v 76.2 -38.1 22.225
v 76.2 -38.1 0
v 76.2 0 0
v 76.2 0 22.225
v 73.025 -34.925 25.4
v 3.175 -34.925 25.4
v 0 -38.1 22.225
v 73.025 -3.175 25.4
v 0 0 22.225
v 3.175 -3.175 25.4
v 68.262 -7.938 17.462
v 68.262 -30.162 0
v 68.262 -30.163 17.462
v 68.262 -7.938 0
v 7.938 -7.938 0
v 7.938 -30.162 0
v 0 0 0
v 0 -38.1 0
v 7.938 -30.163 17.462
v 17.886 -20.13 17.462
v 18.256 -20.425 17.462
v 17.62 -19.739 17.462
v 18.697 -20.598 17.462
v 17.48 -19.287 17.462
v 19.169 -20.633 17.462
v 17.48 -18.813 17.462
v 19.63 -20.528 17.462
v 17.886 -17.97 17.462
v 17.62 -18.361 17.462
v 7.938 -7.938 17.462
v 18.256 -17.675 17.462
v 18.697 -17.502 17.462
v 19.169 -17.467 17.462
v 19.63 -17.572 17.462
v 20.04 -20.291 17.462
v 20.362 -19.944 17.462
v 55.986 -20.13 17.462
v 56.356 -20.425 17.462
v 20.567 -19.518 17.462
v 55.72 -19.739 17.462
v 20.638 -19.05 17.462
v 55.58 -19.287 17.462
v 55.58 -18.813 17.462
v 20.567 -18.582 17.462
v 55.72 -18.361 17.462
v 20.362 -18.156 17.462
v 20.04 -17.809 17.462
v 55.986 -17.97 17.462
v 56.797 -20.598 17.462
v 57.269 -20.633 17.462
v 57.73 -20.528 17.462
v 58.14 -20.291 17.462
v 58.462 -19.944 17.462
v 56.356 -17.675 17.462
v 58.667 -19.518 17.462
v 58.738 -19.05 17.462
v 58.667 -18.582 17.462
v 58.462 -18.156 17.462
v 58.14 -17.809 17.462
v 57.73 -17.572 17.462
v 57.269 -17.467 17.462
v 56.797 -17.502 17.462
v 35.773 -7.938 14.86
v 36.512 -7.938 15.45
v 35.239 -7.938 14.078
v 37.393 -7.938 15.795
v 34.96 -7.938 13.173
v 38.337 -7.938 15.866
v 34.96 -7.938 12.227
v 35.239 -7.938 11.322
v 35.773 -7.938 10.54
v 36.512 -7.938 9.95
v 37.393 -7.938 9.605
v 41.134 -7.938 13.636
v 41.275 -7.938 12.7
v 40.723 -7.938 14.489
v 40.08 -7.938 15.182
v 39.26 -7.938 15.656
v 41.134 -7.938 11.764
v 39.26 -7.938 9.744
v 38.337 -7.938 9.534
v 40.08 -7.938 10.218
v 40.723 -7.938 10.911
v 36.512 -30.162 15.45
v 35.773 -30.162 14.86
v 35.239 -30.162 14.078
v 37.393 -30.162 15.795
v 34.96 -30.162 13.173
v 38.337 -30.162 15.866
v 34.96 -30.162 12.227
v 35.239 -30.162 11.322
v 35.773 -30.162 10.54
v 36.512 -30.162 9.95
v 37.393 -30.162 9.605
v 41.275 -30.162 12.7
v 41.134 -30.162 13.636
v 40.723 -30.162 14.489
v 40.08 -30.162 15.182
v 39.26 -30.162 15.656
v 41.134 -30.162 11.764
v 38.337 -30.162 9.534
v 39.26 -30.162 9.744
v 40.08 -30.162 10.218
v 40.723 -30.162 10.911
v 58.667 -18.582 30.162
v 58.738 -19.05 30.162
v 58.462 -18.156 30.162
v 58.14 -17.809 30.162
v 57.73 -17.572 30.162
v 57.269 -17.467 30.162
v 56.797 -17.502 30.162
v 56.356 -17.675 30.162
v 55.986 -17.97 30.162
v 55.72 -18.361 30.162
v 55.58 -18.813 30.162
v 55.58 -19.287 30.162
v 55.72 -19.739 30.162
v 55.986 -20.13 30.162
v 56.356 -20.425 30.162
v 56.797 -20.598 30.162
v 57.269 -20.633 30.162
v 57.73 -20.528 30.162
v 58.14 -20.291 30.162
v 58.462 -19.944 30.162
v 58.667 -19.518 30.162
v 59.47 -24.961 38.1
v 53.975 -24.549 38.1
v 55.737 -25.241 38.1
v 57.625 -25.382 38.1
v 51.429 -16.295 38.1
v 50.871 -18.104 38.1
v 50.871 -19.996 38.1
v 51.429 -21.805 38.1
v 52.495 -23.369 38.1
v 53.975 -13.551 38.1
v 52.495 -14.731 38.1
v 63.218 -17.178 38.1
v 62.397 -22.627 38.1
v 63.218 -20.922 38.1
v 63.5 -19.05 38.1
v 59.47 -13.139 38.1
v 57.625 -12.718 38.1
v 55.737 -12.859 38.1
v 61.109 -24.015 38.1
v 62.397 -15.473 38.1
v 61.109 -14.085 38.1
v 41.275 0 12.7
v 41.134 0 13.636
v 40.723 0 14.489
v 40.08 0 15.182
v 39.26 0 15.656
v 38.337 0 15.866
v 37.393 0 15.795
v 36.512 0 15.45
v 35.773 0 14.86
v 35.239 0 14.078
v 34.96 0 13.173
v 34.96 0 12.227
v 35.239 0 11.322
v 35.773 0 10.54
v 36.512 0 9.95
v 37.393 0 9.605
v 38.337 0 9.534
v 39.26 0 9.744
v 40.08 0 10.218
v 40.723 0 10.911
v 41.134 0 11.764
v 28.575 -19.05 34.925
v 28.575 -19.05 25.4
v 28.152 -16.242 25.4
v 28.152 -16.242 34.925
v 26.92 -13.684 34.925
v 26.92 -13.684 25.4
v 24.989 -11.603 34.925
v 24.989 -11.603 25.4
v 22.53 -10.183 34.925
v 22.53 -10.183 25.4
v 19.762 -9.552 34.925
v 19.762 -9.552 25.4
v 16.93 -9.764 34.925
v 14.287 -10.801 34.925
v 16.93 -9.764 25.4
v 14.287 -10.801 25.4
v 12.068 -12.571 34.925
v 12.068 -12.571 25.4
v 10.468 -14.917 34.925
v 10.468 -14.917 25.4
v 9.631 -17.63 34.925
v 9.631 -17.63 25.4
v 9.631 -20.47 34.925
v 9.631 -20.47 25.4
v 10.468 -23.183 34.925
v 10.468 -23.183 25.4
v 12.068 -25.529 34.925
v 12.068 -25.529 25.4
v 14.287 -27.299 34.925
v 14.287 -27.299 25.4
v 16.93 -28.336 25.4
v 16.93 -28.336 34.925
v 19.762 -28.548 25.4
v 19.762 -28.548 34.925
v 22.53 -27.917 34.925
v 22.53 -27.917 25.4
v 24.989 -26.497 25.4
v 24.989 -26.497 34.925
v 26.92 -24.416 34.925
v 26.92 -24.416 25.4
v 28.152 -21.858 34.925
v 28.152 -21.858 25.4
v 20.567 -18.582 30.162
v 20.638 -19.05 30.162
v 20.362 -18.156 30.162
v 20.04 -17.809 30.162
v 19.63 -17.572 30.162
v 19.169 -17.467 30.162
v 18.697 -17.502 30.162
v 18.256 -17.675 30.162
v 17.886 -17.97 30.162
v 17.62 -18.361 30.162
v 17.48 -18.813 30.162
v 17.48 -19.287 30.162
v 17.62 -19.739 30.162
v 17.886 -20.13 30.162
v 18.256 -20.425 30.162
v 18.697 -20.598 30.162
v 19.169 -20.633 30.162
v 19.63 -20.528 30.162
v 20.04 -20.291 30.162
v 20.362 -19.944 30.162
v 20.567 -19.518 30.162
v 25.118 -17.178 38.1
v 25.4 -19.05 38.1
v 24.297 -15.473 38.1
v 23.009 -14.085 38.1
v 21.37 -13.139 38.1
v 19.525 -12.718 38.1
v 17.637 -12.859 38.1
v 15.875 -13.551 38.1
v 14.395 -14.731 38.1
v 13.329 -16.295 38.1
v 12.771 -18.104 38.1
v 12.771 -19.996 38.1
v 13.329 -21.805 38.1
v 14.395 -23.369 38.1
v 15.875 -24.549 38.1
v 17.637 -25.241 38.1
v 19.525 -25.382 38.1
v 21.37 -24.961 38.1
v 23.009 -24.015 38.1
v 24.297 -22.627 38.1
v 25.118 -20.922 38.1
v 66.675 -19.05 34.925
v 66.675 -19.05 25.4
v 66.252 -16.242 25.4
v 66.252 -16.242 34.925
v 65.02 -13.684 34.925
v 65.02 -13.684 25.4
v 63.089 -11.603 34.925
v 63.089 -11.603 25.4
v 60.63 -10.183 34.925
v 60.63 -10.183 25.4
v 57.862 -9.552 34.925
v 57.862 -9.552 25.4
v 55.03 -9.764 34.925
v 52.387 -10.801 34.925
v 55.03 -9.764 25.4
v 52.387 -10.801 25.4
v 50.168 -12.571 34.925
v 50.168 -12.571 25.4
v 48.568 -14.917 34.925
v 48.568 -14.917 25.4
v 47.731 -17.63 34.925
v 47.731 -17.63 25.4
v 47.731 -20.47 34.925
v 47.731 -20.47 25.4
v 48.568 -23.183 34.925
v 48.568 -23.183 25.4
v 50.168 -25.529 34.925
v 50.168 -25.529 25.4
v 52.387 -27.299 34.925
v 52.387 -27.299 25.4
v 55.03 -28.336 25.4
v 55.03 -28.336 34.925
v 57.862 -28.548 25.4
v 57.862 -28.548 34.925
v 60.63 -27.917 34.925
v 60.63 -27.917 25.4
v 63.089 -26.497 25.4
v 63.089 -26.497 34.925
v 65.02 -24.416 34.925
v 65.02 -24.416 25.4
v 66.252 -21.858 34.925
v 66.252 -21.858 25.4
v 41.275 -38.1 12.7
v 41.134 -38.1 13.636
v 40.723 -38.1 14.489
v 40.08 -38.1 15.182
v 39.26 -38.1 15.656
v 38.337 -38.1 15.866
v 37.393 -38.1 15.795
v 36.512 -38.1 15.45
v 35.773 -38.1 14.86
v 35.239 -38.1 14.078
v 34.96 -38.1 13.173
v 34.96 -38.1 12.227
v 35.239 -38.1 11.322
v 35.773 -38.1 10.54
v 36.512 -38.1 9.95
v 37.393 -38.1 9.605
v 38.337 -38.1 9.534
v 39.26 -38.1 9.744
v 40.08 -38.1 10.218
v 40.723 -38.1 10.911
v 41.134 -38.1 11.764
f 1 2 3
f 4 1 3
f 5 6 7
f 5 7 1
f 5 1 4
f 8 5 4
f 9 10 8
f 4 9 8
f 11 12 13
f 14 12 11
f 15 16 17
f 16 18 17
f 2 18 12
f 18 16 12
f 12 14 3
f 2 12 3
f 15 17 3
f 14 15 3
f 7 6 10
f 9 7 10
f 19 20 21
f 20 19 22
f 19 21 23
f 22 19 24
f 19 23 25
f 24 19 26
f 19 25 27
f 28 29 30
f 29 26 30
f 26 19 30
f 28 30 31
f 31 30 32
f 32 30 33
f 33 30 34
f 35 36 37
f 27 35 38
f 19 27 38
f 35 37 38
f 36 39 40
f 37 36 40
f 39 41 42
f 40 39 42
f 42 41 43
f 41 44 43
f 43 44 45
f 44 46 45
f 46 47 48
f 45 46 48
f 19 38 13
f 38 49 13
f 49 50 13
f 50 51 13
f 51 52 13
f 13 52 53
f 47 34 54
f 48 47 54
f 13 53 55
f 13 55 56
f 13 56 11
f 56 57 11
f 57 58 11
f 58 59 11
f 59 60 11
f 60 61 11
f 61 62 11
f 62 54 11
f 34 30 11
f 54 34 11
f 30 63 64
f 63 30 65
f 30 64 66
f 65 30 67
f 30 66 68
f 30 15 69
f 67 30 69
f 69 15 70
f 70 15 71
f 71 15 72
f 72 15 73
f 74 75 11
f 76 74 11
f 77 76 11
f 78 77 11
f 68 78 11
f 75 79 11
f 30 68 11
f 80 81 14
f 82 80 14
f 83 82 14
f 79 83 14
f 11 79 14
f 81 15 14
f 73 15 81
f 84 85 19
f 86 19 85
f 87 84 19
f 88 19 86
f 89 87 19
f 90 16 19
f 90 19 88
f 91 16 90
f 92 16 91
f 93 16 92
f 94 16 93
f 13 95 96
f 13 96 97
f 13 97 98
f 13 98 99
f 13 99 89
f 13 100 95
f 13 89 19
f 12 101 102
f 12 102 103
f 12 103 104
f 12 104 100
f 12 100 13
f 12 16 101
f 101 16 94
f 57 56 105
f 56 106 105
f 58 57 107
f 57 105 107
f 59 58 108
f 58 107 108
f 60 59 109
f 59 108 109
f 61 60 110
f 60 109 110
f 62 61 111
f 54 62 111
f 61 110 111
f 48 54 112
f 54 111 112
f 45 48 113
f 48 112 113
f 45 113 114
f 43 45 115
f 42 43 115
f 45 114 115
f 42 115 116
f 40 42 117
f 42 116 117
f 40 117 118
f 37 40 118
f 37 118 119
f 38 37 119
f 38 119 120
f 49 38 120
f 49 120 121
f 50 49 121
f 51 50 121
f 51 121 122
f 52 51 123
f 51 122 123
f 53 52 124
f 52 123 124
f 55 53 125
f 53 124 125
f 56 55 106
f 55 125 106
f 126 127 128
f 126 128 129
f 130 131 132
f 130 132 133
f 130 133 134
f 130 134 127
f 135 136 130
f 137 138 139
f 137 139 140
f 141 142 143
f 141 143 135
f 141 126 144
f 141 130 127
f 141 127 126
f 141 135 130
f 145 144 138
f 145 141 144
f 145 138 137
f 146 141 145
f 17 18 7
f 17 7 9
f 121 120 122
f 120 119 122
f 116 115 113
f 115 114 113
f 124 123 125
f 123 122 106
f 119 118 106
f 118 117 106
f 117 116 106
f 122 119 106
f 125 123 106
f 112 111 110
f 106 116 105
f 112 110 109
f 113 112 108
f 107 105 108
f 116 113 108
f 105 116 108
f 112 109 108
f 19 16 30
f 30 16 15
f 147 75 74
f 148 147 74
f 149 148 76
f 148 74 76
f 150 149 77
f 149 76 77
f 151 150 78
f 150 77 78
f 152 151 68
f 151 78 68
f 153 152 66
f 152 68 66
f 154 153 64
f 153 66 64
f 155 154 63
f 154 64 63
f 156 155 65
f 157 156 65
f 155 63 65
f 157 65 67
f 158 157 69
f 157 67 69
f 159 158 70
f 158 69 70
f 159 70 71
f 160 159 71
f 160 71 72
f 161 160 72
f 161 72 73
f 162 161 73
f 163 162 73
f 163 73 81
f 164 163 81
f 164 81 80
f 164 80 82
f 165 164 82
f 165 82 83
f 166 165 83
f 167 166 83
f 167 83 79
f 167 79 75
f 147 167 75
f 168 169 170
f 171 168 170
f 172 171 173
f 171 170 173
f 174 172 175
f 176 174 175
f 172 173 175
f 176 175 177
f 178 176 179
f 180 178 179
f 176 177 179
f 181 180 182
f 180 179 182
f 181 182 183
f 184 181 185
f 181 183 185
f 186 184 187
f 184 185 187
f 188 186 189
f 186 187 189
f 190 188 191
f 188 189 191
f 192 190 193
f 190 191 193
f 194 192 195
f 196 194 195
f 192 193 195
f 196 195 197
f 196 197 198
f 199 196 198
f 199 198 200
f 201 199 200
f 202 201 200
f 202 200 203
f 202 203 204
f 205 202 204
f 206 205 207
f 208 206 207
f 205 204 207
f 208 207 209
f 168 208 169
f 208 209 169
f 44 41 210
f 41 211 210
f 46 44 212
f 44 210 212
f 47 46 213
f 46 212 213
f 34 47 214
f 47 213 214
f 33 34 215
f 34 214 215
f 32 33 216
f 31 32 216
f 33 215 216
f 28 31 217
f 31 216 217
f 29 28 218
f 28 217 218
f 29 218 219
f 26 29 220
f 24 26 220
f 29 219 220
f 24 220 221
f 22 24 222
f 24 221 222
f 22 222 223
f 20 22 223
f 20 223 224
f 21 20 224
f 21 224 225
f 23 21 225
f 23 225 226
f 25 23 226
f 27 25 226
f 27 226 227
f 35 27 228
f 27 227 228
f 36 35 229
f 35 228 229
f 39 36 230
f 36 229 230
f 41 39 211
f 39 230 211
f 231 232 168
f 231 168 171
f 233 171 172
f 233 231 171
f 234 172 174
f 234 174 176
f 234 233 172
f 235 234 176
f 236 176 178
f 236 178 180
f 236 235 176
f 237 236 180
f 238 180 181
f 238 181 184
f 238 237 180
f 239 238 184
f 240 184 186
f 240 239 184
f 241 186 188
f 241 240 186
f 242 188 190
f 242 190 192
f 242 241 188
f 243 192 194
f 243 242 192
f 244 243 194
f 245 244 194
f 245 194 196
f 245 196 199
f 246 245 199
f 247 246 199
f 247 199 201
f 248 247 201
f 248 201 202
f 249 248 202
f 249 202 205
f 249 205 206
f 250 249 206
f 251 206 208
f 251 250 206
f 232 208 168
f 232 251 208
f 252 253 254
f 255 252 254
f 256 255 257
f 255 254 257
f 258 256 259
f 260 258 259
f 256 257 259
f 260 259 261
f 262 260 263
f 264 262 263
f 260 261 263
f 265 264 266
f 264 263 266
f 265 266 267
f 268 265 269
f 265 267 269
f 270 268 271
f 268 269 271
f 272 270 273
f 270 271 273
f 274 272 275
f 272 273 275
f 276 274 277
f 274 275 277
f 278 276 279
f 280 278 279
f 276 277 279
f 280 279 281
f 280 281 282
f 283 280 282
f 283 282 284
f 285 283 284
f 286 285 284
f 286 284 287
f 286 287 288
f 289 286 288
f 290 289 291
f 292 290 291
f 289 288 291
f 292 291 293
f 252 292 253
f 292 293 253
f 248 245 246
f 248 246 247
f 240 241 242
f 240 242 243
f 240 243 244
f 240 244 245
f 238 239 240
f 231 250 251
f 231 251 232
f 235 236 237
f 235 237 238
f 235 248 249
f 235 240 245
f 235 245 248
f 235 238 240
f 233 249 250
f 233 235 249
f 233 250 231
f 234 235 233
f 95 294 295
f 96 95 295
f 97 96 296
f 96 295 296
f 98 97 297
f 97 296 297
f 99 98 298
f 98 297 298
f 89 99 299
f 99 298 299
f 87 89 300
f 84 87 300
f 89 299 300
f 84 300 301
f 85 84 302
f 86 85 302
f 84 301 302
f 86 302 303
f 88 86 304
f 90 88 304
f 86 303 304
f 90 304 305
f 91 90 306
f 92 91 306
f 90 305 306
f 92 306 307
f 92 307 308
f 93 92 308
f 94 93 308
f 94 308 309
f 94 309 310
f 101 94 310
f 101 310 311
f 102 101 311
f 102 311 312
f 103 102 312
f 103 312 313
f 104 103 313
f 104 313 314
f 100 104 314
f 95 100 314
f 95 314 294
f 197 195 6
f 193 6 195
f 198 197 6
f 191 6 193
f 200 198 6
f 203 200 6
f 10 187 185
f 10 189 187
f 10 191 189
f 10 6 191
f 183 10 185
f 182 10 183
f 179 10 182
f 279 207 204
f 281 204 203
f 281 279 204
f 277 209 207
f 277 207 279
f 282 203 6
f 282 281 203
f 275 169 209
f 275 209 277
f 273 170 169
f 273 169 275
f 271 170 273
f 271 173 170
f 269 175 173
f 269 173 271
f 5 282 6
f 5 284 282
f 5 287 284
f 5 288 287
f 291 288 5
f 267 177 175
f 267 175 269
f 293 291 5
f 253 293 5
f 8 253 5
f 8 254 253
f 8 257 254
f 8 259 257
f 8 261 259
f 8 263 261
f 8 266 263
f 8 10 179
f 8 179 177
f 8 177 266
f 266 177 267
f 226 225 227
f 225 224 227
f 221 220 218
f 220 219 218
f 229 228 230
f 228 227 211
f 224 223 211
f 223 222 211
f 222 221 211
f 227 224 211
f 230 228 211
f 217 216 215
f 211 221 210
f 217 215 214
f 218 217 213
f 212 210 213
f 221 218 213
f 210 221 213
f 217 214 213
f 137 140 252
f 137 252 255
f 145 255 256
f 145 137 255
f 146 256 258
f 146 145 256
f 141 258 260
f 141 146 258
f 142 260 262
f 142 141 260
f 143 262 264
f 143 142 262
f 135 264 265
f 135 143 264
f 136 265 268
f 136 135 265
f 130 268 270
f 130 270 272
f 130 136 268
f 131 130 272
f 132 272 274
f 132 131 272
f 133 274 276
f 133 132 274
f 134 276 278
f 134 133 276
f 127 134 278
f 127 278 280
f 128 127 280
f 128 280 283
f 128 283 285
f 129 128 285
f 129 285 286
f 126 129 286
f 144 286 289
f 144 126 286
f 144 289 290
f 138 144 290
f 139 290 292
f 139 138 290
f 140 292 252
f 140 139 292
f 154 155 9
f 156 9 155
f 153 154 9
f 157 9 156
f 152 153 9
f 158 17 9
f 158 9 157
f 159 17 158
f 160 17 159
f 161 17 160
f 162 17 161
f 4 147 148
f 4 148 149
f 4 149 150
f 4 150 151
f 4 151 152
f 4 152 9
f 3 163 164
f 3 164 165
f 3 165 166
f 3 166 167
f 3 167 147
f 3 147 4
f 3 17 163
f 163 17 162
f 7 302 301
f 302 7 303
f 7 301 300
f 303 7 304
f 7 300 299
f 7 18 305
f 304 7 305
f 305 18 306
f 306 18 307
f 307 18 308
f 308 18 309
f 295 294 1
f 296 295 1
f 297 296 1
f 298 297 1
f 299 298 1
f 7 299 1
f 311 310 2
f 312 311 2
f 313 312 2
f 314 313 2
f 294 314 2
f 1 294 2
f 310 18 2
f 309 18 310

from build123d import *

# Parameters (mm, degrees)
F0_W     = 76.2
F0_H     = 38.1
F1_DEPTH = 25.4
F2_R     = 9.525
F3_DEPTH = 12.7
F4_SIZE2 = 3.175
F4_SIZE  = 3.175
F5_T     = 7.9375
F6_R     = 3.175
F7_DEPTH = 38.1


# Not quite as in the source:
# - a shell that OpenCascade refuses in one call is made with other operations: the cavity is built on its own and cut out


with BuildPart() as f1:
    # F0 (on Top) → F1 (new body)
    with BuildSketch(Plane.XY):
        with Locations((38.1, -19.05)):
            Rectangle(F0_W, F0_H)
    extrude(amount=F1_DEPTH)

    # F2 (on face) → F3 (join)
    with BuildSketch(Plane.XY.offset(25.4)):
        with Locations((57.15, -19.05)):
            Circle(F2_R)
        with Locations((19.05, -19.05)):
            Circle(F2_R)
    extrude(amount=F3_DEPTH)

    # F4
    f4_edges = [f1.edges().sort_by_distance(p)[0] for p in [
        (9.525, -19.05, 38.1),
        (47.625, -19.05, 38.1),
        (76.2, -19.05, 25.4),
        (38.1, -38.1, 25.4),
        (0, -19.05, 25.4),
        (38.1, 0, 25.4),
    ]]
    chamfer(f4_edges, length=F4_SIZE, length2=F4_SIZE2)

    # F5: shell of thickness 7.9375, made by hand


with BuildPart() as f5_core1:
    # F5_t2: copy of F1
    add(f1.part)

    # the walls: a layer under each face that stays
    f5_faces = [f5_core1.faces().sort_by_distance(p)[0] for p in [
        (38.1, 0, 11.1125),
        (76.2, -19.05, 11.1125),
        (38.1, -1.5875, 23.8125),
        (0, -19.05, 11.1125),
        (38.1, -38.1, 11.1125),
        (74.6125, -19.05, 23.8125),
        (38.1, -19.05, 25.4),
        (1.5875, -19.05, 23.8125),
        (38.1, -36.5125, 23.8125),
        (9.525, -19.05, 30.1625),
        (47.625, -19.05, 30.1625),
        (11.1125, -19.05, 36.5125),
        (49.2125, -19.05, 36.5125),
        (19.05, -19.05, 38.1),
        (57.15, -19.05, 38.1),
    ]]
    thicken(f5_faces, amount=-F5_T, mode=Mode.SUBTRACT)

    # F5_s3 → F5_t4 (revolve, cut)
    with BuildSketch(Plane.XZ.offset(19.05)):
        Polygon((28.654375, 25.479375), (28.575, 17.4625), (20.6375, 17.4625), (20.6375, 25.4), align=None)
    revolve(axis=Axis((19.05, -19.05, 25.4), (0, 0, 1)), mode=Mode.SUBTRACT)

    # F5_s5 → F5_t6 (revolve, cut)
    with BuildSketch(Plane.XZ.offset(19.05)):
        Polygon((66.754375, 25.479375), (66.675, 17.4625), (58.7375, 17.4625), (58.7375, 25.4), align=None)
    revolve(axis=Axis((57.15, -19.05, 25.4), (0, 0, 1)), mode=Mode.SUBTRACT)


with BuildPart() as f1_1:
    add(f1.part)

    # what is left inside the walls is the cavity
    f5_cavity = [f5_core1.part.solids().sort_by_distance(p)[0] for p in [
        (38.1, -22.754167, 0.079375),
    ]]
    add(f5_cavity, mode=Mode.SUBTRACT)

    # F6 (on face) → F7 (cut)
    with BuildSketch(Plane.XZ.offset(38.1)):
        with Locations((38.1, 12.7)):
            Circle(F6_R)
    extrude(amount=-F7_DEPTH, mode=Mode.SUBTRACT)


solid = f1_1.part
